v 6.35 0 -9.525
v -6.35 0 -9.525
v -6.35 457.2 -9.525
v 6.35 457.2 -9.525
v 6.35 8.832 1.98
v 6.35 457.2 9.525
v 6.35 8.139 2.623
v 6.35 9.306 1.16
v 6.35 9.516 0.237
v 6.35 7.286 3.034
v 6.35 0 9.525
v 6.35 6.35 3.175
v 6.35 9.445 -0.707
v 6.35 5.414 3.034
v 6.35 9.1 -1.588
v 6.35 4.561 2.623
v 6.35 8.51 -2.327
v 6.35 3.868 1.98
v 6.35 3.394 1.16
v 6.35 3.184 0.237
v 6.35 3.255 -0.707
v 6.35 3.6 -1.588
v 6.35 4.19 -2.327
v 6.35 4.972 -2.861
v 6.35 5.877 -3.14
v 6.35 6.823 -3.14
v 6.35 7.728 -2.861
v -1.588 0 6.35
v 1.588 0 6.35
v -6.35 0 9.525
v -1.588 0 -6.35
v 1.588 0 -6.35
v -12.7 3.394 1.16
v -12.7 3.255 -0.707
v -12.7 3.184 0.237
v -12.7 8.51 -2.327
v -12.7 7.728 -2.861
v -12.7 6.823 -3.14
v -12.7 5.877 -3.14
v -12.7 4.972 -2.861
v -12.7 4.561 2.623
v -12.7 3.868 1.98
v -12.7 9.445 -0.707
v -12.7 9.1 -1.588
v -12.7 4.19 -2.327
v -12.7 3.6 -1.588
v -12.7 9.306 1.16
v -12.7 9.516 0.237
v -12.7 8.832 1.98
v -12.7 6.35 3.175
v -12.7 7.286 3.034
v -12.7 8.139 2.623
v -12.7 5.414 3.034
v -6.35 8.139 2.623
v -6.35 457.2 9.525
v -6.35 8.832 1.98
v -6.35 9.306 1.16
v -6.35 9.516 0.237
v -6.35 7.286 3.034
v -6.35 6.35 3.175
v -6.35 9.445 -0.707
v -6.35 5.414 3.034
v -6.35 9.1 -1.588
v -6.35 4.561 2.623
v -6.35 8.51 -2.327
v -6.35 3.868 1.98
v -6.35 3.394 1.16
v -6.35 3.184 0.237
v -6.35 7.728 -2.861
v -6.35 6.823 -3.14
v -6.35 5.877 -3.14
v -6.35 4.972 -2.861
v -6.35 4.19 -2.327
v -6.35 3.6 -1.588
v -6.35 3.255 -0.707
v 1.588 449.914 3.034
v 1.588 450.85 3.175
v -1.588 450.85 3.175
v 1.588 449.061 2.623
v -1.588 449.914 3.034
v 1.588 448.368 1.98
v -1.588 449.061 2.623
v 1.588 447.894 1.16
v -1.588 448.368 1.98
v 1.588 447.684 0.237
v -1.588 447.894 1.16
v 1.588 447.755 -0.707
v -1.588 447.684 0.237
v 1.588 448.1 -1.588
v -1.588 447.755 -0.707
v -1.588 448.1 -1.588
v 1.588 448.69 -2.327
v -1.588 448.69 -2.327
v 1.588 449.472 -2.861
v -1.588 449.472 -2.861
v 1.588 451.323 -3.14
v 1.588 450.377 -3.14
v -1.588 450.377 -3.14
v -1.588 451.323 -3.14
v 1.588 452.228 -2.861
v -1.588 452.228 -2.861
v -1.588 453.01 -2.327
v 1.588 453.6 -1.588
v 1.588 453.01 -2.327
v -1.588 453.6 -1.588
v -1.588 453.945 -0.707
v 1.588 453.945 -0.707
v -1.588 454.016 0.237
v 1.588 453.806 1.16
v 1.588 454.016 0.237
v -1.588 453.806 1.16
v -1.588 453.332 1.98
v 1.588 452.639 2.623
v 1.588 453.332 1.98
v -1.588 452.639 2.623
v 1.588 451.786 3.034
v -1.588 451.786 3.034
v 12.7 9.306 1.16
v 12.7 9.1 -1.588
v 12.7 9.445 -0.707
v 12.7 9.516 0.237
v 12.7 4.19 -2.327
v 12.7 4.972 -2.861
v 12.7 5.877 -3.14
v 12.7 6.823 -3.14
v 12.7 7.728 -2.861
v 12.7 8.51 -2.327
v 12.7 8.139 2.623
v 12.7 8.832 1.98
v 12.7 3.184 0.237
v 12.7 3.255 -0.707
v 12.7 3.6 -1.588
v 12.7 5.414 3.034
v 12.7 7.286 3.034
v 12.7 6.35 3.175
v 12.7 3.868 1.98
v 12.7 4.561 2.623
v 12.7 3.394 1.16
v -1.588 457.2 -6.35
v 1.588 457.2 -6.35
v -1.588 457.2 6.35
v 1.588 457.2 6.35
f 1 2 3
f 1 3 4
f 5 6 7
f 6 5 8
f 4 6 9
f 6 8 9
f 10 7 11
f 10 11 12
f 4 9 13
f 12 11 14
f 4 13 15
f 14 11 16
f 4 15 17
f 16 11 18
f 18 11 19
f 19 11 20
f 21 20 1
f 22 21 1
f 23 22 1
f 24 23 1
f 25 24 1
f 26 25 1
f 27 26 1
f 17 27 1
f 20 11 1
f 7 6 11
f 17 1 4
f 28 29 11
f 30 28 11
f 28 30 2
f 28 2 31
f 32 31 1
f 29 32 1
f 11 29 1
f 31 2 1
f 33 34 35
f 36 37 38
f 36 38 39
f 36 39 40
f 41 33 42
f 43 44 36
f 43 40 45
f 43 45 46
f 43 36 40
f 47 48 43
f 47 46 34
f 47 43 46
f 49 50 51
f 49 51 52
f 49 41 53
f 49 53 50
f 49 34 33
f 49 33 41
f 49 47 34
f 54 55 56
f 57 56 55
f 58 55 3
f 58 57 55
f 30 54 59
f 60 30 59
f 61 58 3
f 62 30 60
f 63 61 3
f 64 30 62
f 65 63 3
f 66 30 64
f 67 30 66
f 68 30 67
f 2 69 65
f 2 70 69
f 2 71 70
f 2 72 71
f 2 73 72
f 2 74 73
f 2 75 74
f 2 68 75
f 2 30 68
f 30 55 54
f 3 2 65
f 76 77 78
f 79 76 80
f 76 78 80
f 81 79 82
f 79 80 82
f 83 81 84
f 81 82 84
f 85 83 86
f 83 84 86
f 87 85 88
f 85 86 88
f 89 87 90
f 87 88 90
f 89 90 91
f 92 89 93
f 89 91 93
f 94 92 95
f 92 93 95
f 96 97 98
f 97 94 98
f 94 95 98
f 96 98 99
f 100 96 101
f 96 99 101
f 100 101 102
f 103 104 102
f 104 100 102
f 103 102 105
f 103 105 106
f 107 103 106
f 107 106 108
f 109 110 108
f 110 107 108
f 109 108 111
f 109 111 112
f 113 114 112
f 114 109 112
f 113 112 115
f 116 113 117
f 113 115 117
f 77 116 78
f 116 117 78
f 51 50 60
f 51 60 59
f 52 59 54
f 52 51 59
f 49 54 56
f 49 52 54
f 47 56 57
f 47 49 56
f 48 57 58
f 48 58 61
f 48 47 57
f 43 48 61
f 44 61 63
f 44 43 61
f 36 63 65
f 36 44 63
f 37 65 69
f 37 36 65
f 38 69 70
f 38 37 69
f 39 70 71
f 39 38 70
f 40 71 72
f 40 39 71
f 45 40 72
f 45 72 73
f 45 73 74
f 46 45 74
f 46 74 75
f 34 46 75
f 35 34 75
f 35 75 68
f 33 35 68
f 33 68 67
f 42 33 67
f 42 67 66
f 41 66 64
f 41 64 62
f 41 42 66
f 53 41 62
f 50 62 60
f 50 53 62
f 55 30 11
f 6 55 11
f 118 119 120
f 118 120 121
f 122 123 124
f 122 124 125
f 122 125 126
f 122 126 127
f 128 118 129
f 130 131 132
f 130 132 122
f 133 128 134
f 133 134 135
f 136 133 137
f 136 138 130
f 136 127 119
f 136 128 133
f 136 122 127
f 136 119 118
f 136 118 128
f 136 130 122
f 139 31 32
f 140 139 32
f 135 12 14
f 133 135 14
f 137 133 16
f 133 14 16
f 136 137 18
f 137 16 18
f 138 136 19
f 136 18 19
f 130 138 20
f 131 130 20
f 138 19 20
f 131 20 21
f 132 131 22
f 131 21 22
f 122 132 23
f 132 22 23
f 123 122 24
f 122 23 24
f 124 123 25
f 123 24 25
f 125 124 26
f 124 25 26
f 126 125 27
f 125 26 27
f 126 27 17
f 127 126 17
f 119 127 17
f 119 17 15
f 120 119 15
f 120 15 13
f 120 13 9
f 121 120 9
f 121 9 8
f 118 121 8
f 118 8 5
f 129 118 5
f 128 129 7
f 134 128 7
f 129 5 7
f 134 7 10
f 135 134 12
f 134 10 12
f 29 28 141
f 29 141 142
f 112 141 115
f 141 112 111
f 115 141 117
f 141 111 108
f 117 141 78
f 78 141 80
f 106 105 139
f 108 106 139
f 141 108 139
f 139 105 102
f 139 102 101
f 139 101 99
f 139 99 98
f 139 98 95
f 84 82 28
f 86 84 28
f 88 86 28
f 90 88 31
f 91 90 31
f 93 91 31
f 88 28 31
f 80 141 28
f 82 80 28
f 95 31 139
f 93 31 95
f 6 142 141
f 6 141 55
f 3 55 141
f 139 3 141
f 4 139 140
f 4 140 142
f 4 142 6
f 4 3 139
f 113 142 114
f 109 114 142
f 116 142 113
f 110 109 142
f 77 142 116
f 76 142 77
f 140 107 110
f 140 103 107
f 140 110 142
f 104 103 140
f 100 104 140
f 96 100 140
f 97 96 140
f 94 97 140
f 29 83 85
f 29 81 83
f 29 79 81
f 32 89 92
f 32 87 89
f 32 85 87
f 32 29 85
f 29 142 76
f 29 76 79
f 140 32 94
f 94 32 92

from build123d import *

# Parameters (mm, degrees)
SKETCH1_W           = 12.7
SKETCH1_H           = 19.05
SKETCH1_W_2         = 3.175
SKETCH1_H_2         = 12.7
BOSS_EXTRUDE1_DEPTH = 457.2
BOSS_EXTRUDE2_REACH = 459.368
SKETCH2_R           = 3.175
SKETCH3_R           = 3.175
BOSS_EXTRUDE3_DEPTH = 6.35
BOSS_EXTRUDE4_START = 6.35
SKETCH4_R           = 3.175
BOSS_EXTRUDE4_DEPTH = 6.35


with BuildPart() as part:
    # Sketch1 → Boss-Extrude1 (new body)
    with BuildSketch(Plane(origin=(0, 0, 0), x_dir=(1, 0, 0), z_dir=(0, 1, 0))):
        Rectangle(SKETCH1_W, SKETCH1_H)
        Rectangle(SKETCH1_W_2, SKETCH1_H_2, mode=Mode.SUBTRACT)
    extrude(amount=BOSS_EXTRUDE1_DEPTH)

    # Sketch2 → Boss-Extrude2 (add, up to next)
    with BuildSketch(Plane(origin=(-1.5875, 0, 0), x_dir=(0, 0, -1), z_dir=(1, 0, 0)), mode=Mode.PRIVATE) as boss_extrude2_sk1:
        with Locations(Location((0, 450.85, 0), (0, 0, 180))):
            Circle(SKETCH2_R)
    boss_extrude2_tool1 = extrude(boss_extrude2_sk1.sketch, amount=BOSS_EXTRUDE2_REACH, mode=Mode.PRIVATE) - part.part
    add(boss_extrude2_tool1.solids().sort_by_distance((-1.5875, 450.85, 0))[0])

    # Sketch3 → Boss-Extrude3 (add)
    with BuildSketch(Plane(origin=(6.35, 0, 0), x_dir=(0, 0, -1), z_dir=(1, 0, 0))):
        with Locations(Location((0, 6.35, 0), (0, 0, 180))):
            Circle(SKETCH3_R)
    extrude(amount=BOSS_EXTRUDE3_DEPTH)

    # Sketch4 → Boss-Extrude4 (add)
    with BuildSketch(Plane.ZY.offset(6.35).offset(BOSS_EXTRUDE4_START)):
        with Locations((0, 6.35)):
            Circle(SKETCH4_R)
    extrude(amount=-BOSS_EXTRUDE4_DEPTH)


solid = part.part
